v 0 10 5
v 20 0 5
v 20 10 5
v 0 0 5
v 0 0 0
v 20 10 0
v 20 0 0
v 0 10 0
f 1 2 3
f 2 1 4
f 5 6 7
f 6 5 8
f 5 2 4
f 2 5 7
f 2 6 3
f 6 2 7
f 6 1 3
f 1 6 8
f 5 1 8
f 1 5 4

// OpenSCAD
width = 20;
height = 10;
label = "plain";
solid = false;

cube([width, height, 5]);
